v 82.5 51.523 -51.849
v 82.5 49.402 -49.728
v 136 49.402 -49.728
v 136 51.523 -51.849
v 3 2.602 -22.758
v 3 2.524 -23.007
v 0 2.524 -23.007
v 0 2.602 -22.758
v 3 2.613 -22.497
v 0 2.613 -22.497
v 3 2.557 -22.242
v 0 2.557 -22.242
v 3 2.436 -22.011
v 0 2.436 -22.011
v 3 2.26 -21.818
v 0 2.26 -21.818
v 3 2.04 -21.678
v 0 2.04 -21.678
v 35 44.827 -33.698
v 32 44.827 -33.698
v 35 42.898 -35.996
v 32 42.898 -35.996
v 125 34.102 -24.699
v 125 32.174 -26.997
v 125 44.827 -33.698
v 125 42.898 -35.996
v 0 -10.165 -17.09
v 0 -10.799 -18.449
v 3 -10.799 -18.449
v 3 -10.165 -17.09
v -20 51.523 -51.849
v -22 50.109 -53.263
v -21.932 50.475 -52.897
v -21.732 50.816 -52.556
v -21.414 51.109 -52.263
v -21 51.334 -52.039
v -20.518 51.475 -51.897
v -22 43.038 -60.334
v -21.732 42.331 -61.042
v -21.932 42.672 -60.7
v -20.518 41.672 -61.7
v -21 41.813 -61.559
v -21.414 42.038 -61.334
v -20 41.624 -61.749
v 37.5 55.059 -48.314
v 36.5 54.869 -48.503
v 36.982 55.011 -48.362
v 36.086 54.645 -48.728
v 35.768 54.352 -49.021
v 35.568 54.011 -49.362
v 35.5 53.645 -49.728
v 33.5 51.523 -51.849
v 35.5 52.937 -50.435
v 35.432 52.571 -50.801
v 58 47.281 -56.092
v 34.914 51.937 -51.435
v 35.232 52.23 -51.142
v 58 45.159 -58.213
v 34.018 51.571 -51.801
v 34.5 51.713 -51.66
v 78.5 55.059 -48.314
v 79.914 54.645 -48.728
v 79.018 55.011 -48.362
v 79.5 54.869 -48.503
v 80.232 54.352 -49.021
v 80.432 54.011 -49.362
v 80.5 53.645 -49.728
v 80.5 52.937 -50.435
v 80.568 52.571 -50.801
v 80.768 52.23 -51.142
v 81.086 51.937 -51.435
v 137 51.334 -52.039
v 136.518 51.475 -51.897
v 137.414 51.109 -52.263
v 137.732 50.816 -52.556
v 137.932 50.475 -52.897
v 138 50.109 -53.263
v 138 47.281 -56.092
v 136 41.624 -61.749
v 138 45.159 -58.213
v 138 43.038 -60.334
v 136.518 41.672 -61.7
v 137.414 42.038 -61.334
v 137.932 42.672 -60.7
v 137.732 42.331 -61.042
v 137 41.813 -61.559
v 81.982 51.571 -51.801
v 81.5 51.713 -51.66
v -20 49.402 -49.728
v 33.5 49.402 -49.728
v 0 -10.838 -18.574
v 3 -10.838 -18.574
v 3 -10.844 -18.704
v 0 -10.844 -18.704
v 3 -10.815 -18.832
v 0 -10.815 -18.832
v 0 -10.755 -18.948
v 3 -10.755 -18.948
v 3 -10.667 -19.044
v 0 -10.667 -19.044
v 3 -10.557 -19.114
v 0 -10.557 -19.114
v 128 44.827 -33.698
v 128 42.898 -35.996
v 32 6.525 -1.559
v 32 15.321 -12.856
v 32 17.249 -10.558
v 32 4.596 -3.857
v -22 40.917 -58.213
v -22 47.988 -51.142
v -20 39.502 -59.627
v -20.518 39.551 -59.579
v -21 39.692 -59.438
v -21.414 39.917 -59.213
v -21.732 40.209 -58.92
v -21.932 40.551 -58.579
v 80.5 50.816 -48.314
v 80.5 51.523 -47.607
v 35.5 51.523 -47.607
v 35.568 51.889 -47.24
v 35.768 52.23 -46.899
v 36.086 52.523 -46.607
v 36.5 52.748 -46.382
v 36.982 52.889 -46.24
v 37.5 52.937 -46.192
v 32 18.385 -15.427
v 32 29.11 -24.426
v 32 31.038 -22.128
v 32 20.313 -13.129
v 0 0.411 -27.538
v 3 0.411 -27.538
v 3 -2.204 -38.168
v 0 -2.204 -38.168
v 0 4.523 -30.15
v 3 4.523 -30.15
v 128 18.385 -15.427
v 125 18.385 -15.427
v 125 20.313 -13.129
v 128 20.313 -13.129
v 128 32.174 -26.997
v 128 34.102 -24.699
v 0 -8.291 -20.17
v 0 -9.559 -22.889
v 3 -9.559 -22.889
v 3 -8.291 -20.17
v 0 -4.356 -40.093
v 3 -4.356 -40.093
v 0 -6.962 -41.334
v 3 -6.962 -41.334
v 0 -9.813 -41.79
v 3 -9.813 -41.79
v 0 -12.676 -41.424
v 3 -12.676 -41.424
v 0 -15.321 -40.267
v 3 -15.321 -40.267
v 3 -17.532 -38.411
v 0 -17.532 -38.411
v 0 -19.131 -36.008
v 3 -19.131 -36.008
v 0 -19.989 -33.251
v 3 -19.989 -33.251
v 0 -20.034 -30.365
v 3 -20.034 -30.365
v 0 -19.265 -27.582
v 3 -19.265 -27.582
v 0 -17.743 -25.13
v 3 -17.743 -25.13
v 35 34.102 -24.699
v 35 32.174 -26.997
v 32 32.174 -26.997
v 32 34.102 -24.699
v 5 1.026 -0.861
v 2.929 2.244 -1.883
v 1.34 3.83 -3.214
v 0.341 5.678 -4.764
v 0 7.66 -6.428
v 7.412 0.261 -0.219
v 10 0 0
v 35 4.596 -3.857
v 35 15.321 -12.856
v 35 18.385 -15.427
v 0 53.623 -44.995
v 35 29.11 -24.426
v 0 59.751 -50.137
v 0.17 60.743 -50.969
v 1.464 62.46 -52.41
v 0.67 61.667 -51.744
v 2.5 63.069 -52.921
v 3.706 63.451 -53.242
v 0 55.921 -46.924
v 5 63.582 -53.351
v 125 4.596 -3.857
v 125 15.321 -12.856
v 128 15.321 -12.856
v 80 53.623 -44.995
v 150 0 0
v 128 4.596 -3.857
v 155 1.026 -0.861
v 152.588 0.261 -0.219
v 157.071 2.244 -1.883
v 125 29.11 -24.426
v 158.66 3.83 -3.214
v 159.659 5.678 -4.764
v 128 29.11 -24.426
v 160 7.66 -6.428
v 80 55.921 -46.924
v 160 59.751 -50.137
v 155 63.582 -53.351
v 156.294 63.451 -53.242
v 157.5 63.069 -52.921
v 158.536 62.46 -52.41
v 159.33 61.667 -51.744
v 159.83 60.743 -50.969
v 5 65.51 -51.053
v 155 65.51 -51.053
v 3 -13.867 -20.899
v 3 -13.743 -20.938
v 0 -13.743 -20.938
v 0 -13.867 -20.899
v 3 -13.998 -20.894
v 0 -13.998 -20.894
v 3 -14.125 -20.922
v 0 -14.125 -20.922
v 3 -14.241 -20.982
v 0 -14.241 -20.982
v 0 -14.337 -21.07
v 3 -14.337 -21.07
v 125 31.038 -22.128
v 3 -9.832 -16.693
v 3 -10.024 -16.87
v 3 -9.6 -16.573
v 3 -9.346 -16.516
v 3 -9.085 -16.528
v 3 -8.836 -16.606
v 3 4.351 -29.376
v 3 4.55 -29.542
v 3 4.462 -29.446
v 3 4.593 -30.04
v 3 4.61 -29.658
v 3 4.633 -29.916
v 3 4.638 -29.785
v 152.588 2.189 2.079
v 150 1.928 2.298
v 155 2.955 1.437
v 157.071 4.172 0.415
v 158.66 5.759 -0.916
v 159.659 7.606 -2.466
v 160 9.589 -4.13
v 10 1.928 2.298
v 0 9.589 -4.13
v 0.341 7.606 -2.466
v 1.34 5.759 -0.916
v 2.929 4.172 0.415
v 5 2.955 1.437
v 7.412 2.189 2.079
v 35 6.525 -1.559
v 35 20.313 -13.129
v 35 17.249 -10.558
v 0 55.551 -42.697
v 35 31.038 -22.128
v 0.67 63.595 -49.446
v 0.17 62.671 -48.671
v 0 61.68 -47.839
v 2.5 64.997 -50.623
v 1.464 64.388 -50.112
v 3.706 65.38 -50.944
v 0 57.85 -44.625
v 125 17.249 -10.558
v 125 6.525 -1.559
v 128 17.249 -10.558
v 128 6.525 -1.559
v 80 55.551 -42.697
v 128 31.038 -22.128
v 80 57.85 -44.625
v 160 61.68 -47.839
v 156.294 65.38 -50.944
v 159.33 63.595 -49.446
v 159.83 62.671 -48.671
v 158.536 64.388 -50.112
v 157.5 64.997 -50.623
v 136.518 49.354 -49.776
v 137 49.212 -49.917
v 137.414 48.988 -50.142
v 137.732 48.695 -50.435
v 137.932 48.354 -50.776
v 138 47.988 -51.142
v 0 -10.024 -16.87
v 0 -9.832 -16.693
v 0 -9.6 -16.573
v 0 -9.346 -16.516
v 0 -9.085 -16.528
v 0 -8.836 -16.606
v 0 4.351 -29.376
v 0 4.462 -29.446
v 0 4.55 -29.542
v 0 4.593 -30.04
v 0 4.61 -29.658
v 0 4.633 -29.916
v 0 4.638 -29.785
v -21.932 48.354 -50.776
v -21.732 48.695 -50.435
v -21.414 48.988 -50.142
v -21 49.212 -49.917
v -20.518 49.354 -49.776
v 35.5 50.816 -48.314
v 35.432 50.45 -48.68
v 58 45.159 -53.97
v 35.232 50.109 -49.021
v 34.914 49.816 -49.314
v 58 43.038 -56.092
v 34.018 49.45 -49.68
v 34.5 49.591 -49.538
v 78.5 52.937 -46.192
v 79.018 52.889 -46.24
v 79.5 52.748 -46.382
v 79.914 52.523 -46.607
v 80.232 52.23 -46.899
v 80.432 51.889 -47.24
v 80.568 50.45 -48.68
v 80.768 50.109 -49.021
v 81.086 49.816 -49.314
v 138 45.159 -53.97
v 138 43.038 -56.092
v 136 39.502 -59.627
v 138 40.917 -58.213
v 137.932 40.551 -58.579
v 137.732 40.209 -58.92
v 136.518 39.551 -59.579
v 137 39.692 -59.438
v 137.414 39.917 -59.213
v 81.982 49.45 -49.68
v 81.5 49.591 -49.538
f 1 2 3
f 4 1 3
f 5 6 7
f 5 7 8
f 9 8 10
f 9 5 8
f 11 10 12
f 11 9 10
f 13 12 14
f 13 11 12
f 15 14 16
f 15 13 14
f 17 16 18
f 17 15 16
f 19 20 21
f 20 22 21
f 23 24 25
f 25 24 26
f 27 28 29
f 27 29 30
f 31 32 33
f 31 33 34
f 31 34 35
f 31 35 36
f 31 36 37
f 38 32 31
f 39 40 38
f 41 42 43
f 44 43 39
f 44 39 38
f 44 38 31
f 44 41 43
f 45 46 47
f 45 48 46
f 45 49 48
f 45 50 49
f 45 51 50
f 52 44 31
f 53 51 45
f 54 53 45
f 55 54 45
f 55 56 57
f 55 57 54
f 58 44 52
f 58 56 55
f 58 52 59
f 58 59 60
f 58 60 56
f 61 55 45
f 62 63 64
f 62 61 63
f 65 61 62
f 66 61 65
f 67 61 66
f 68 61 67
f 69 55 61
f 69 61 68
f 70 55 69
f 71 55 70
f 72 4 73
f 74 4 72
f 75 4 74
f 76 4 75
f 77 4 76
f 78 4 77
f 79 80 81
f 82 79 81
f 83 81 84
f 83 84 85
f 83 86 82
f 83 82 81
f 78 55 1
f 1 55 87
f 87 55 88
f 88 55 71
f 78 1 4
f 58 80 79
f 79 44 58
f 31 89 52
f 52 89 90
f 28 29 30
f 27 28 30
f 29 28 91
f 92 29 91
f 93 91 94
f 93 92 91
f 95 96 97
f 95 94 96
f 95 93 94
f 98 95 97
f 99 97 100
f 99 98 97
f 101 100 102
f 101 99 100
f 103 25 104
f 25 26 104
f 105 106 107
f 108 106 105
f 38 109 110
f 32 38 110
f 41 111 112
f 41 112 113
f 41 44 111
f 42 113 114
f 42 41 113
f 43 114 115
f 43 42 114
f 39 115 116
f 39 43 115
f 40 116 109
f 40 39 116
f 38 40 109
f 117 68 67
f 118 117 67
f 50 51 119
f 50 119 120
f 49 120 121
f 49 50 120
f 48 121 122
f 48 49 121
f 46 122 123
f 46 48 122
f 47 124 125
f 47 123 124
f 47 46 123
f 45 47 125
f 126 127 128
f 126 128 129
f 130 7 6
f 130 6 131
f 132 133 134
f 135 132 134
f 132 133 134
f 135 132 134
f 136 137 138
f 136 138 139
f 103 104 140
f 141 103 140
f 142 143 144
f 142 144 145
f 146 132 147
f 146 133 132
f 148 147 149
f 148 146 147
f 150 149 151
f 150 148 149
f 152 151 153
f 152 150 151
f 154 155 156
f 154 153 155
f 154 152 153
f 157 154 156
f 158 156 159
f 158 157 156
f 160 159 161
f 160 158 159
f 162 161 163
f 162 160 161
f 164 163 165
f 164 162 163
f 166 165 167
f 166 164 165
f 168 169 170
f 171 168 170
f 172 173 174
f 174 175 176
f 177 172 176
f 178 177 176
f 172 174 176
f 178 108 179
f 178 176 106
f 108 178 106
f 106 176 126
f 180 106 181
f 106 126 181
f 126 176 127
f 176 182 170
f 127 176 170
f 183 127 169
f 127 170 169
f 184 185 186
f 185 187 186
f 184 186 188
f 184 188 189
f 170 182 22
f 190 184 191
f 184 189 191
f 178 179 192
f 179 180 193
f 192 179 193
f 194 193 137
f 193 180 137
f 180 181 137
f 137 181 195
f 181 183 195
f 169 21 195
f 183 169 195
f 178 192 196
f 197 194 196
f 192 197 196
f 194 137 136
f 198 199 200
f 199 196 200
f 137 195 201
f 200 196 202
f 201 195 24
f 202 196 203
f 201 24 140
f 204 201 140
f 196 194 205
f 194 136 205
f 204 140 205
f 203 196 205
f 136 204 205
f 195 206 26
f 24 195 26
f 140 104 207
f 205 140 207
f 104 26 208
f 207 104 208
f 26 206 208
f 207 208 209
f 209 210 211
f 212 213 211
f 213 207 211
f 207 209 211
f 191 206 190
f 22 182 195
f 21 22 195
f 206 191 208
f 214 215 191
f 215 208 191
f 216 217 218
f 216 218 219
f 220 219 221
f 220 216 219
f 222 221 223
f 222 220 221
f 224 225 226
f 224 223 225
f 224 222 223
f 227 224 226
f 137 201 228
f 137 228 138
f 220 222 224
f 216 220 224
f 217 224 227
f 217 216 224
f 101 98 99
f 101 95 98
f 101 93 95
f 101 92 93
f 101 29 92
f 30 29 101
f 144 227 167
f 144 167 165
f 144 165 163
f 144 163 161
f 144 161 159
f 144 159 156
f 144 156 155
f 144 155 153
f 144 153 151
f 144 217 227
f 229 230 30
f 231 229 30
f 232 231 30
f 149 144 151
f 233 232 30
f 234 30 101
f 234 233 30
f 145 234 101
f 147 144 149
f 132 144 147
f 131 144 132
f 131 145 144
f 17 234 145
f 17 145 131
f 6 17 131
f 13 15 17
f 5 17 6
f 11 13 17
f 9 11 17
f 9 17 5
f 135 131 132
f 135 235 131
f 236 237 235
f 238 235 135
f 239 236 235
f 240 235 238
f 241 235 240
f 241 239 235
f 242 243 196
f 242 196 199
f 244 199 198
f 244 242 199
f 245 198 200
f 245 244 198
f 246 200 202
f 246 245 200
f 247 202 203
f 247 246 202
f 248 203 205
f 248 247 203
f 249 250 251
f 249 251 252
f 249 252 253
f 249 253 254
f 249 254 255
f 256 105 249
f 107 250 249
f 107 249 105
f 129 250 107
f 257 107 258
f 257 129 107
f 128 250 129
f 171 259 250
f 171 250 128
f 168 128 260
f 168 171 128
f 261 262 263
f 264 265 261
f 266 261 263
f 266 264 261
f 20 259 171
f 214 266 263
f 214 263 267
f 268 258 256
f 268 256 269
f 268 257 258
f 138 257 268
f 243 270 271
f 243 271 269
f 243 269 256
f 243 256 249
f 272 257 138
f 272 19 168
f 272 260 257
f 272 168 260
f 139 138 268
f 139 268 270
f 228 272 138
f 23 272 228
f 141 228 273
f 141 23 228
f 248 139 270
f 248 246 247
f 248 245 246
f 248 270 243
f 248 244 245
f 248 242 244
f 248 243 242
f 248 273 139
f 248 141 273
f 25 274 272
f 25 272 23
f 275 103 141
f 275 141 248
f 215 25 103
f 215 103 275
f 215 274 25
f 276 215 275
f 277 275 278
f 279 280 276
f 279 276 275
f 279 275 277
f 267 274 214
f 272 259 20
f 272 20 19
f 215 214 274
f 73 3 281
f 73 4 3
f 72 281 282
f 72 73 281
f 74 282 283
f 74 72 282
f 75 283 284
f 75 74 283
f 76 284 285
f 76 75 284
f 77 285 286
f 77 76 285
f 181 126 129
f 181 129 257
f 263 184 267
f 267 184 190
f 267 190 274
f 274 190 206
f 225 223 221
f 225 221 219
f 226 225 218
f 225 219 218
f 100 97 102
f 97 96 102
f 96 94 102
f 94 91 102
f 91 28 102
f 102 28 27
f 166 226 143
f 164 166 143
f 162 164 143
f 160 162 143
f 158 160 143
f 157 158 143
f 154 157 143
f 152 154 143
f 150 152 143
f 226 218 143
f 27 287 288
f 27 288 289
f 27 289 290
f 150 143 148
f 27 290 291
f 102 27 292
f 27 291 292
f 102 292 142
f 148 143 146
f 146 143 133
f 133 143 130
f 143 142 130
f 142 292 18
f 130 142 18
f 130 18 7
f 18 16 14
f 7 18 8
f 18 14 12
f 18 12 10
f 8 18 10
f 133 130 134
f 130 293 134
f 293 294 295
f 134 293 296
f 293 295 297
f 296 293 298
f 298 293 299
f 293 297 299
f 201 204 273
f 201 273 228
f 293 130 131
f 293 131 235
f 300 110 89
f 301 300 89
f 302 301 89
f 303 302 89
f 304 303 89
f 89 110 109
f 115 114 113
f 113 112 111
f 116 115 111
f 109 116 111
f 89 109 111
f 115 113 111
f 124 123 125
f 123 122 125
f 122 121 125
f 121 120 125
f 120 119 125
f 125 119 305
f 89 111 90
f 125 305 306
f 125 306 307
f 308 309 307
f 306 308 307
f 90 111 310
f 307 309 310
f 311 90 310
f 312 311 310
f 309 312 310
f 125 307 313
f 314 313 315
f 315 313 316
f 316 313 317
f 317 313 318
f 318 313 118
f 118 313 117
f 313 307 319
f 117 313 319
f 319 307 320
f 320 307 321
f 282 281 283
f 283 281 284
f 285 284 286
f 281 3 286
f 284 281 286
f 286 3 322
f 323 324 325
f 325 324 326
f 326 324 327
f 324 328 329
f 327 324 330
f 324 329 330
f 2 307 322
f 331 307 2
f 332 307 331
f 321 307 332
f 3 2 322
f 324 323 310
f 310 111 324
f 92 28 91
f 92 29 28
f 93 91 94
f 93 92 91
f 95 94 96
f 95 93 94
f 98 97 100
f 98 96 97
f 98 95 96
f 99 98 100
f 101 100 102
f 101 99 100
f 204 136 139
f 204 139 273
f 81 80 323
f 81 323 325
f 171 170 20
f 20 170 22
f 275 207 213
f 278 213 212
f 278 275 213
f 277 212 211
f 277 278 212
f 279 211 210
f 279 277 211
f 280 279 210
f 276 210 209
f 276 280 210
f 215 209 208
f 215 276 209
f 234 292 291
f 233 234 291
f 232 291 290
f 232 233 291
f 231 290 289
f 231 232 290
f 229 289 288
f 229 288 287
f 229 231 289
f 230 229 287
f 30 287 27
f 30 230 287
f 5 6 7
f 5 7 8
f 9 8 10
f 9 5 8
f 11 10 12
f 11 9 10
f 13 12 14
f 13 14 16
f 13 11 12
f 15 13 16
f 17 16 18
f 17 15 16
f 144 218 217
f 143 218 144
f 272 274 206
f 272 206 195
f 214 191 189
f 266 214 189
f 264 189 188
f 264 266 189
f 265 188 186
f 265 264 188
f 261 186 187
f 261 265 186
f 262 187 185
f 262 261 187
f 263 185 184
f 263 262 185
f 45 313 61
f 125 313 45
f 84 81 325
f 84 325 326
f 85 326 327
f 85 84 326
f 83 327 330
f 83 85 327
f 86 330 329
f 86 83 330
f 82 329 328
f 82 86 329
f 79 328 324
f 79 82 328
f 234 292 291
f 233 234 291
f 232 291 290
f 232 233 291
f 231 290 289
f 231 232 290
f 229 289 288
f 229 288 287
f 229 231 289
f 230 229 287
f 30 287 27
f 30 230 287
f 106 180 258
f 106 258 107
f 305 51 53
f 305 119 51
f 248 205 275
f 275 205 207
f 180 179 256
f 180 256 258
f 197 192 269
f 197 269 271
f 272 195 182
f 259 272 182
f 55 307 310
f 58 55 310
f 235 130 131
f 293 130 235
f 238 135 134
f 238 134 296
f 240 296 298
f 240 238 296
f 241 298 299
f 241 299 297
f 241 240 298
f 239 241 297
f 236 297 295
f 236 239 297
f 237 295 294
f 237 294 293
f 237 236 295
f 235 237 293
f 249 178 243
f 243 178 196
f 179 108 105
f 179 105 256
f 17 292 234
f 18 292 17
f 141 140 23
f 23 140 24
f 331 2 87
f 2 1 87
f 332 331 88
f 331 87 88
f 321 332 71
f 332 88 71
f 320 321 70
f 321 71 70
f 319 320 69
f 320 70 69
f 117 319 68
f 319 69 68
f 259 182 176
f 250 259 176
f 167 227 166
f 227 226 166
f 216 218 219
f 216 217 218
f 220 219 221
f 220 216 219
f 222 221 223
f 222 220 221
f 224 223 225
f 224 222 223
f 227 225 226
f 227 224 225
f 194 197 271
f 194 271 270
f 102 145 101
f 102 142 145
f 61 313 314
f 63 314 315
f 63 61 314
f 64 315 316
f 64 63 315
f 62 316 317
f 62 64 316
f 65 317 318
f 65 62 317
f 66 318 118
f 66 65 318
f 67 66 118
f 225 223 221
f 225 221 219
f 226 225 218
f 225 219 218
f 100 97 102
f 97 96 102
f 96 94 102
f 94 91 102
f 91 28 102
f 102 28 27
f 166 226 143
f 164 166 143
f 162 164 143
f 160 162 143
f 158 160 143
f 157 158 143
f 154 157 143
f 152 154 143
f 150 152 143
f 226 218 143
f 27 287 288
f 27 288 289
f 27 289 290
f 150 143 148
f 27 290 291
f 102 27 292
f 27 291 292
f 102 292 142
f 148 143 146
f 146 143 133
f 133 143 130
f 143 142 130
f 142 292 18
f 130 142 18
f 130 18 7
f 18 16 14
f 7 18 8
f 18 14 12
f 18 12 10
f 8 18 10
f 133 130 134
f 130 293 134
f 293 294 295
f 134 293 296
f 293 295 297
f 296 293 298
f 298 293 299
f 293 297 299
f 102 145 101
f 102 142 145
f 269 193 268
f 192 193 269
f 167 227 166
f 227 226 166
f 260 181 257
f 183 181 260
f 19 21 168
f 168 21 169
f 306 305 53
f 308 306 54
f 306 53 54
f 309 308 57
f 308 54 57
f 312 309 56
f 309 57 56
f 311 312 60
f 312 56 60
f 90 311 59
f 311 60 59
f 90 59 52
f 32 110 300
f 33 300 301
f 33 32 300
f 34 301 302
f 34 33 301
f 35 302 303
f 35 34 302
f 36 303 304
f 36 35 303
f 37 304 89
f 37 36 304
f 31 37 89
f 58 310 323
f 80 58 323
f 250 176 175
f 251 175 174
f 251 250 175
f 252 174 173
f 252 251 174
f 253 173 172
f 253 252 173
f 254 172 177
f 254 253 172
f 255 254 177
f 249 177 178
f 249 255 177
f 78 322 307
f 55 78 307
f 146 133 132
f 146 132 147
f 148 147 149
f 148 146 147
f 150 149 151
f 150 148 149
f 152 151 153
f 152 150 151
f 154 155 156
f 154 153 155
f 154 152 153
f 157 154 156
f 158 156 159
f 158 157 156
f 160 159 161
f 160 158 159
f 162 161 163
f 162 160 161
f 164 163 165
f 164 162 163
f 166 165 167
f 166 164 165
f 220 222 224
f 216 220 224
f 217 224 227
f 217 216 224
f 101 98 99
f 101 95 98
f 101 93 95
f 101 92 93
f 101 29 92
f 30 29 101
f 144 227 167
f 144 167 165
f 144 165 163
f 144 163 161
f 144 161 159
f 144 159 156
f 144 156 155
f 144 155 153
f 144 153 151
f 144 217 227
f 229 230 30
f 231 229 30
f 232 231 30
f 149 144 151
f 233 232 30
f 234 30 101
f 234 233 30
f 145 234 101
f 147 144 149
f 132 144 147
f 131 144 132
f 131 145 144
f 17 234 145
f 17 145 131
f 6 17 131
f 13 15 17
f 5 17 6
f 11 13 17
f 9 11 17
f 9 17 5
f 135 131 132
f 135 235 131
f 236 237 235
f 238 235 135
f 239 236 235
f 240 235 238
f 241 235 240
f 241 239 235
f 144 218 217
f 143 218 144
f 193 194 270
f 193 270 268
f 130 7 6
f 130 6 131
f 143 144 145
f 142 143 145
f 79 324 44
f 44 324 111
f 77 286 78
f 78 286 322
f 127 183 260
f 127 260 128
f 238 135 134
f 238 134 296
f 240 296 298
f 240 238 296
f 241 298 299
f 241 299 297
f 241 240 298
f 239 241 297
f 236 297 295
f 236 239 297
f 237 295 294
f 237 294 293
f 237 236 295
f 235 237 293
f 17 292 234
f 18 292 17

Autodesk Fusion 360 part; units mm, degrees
sketch "スケッチ1" plane through (0, 0, 0) normal (0, 0, 1) x (1, 0, 0) in component "base1"
  line L0 (0, 0) -> (160, 0)
  line L1 (160, 0) -> (160, 70)
  line L2 (160, 70) -> (0, 70) construction
  line L3 (0, 70) -> (0, 0)
  line L4 (0, 70) -> (160, 70) construction
  line L5 (160, 70) -> (160, 83)
  line L6 (160, 83) -> (0, 83)
  line L7 (0, 83) -> (0, 70)
  line L8 (80, 70) -> (0, 70)
  line L9 (0, 70) -> (0, 73)
  line L10 (0, 73) -> (80, 73)
  line L11 (80, 73) -> (80, 70)
  line L12 (32, 24) -> (35, 24)
  line L13 (35, 24) -> (35, 38)
  line L14 (35, 38) -> (32, 38)
  line L15 (32, 38) -> (32, 24)
  line L16 (32, 6) -> (35, 6)
  line L17 (35, 6) -> (35, 20)
  line L18 (35, 20) -> (32, 20)
  line L19 (32, 20) -> (32, 6)
  line L20 (125, 6) -> (128, 6)
  line L21 (128, 6) -> (128, 20)
  line L22 (128, 20) -> (125, 20)
  line L23 (125, 20) -> (125, 6)
  line L24 (125, 24) -> (128, 24)
  line L25 (128, 24) -> (128, 38)
  line L26 (128, 38) -> (125, 38)
  line L27 (125, 38) -> (125, 24)
  line L28 (0, 0) -> (32, 6) construction
  line L29 (128, 6) -> (160, 0) construction
  line L30 (32, 56) -> (35, 56)
  line L31 (35, 56) -> (35, 42)
  line L32 (35, 42) -> (32, 42)
  line L33 (32, 42) -> (32, 56)
  line L34 (125, 56) -> (128, 56)
  line L35 (128, 56) -> (128, 42)
  line L36 (128, 42) -> (125, 42)
  line L37 (125, 42) -> (125, 56)
  dimension "d1" = 160
  dimension "d2" = 70
  dimension "d9" = 3
  dimension "d25" = 10
  dimension "d39" = 14
  dimension "d40" = 32
  dimension "d41" = 50
  dimension "d42" = 90
  dimension "d43" = 3
  dimension "d74" = 14
extrude "押し出し1" add sketch "スケッチ1" along normal blind 3 contours L0 L1 L3 L5 L6 L7 L8 L10 L11 makes body 1 in component "base1"
sketch "スケッチ1 (2)" plane through (0, 0, 0) normal (0, 1, 0) x (1, 0, 0) in component "back1"
  line L0 (0, 0) -> (-160, 0)
  line L1 (-160, 0) -> (-160, -14)
  line L2 (-160, -14) -> (0, -14)
  line L3 (0, -14) -> (0, 0)
  line L4 (-80, -14) -> (-80, 0) construction
  line L5 (0, -8) -> (-80, -8)
  line L6 (-80, -8) -> (-80, -5)
  line L7 (-80, -5) -> (0, -5)
  line L8 (0, -5) -> (0, -8)
  line L9 (-102.5, -14) -> (-57.5, -14)
  line L10 (-57.5, -14) -> (-57.5, -19)
  line L11 (-57.5, -19) -> (-102.5, -19)
  line L12 (-102.5, -19) -> (-102.5, -14)
  line L13 (-102.5, -19) -> (-160, -14) construction
  line L14 (-57.5, -19) -> (0, -14) construction
  dimension "d10" = 160
  dimension "d11" = 3
  dimension "d18" = 5
  dimension "d20" = 6
  dimension "d26" = 45
  dimension "d28" = 11
extrude "押し出し1'" add sketch "スケッチ1 (2)" along normal blind 3 separate body contours L0 L1 L2 L3 L5 L6 L7 L9 | L2 L9 L10 L11 L12 makes body 2 in component "back1"
fillet "フィレット1" radius 2 4 edges at (-160, 1.5, 0) (-160, 1.5, 14) (0, 1.5, 14) (0, 1.5, 0) on bodies 2 in component "back1"
fillet "フィレット1" radius 2 2 edges at (-102.5, 1.5, 14) (-57.5, 1.5, 14) on bodies 2 in component "back1"
fillet "フィレット1" radius 2 2 edges at (-102.5, 1.5, 19) (-57.5, 1.5, 19) on bodies 2 in component "back1"
fillet "フィレット1'" radius 10 2 edges at (0, 0, 1.5) (160, 0, 1.5) on bodies 1 in component "base1"
fillet "フィレット1'" radius 5 2 edges at (0, 83, 1.5) (160, 83, 1.5) on bodies 1 in component "base1"
sketch "スケッチ1 (3)" plane through (0, 0, 0) normal (1, 0, 0) x (0, 1, 0) in component "leg1"
  line L0 (12.7409, -43.8634) -> (93.405, 23.8218) construction
  line L1 (12.7409, -43.8634) -> (12.7409, -59.189) construction
  circle A0 centre (12.7031, -30.6554) radius 10.1422
  line L2 (2.5609, -30.6554) -> (22.8453, -30.6554)
  line L3 (22.8453, -30.6554) -> (22.8453, -19.5375)
  line L4 (2.5609, -24.9727) -> (2.5609, -30.6554)
  line L5 (2.5609, -24.9727) -> (22.8453, -19.5375)
  line L6 (4.4927, -24.4551) -> (2.9398, -18.6595)
  line L7 (2.9398, -18.6595) -> (16.4628, -15.0361)
  line L8 (16.4628, -15.0361) -> (18.0157, -20.8316)
  line L9 (7.3905, -23.6786) -> (6.614, -20.7809)
  line L10 (6.614, -20.7809) -> (3.7163, -21.5573)
  dimension "d44" = 130
  dimension "d46" = 3
  dimension "d47" = 3
  dimension "d48" = 14
  dimension "d49" = 15
  dimension "d59" = 3
  dimension "d61" = 5
  dimension "d62" = 2
extrude "押し出し1''" add sketch "スケッチ1 (3)" along normal blind 3 separate body contours A0 L2 | A0 L4 L5 | A0 L2 L5 | A0 L3 L5 | A0 L5 L9 | A0 L5 L6 L7 L8 L9 L10 picked at (7.5453, -22.4968) makes body 3 in component "leg1"
fillet "フィレット1''" radius 1 2 edges at (1.5, 2.9398, -18.6595) (1.5, 16.4628, -15.0361) on bodies 3 in component "leg1"
fillet "フィレット1''" radius 0.5 2 edges at (1.5, 3.7163, -21.5573) (1.5, 2.5609, -24.9727) on bodies 3 in component "leg1"
fillet "フィレット1''" radius 0.5 1 edges at (1.5, 22.8453, -19.5375) on bodies 3 in component "leg1"
component "stand1" placed x (1, 0, 0) y (0, 0.766044, -0.642788) z (0, 0.642788, 0.766044) at (0, 0, 0)
component "base1" placed x (1, 0, 0) y (0, 1, 0) z (0, 0, 1) at (0, 0, 0) in component "stand1"
component "back1" placed x (1, 0, 0) y (0, 0.996195, -0.087156) z (0, 0.087156, 0.996195) at (138, 68.5883, -20.2855) in component "stand1"
component "leg1" placed x (1, 0, 0) y (0, 1, 0) z (0, 0, 1) at (0, 0, 0) in component "stand1"
component "leg1" placed x (1, 0, 0) y (0, 1, 0) z (0, 0, 1) at (0, 0, 0) in component "stand1"
equation "d1 = width1"
equation "d2 = depth1"
equation "width1 = 160 mm"
equation "depth1 = 70 mm"
equation "thickness1 = 3 mm"
equation "d7 = thickness1"
equation "d9 = thickness1"
equation "d10 = width1"
equation "d11 = thickness1"
equation "d12 = thickness1"
equation "d43 = thickness1"
equation "d46 = thickness1"
equation "d48 = d39"
equation "d51 = thickness1"
equation "d61 = d59 + 2 mm"
